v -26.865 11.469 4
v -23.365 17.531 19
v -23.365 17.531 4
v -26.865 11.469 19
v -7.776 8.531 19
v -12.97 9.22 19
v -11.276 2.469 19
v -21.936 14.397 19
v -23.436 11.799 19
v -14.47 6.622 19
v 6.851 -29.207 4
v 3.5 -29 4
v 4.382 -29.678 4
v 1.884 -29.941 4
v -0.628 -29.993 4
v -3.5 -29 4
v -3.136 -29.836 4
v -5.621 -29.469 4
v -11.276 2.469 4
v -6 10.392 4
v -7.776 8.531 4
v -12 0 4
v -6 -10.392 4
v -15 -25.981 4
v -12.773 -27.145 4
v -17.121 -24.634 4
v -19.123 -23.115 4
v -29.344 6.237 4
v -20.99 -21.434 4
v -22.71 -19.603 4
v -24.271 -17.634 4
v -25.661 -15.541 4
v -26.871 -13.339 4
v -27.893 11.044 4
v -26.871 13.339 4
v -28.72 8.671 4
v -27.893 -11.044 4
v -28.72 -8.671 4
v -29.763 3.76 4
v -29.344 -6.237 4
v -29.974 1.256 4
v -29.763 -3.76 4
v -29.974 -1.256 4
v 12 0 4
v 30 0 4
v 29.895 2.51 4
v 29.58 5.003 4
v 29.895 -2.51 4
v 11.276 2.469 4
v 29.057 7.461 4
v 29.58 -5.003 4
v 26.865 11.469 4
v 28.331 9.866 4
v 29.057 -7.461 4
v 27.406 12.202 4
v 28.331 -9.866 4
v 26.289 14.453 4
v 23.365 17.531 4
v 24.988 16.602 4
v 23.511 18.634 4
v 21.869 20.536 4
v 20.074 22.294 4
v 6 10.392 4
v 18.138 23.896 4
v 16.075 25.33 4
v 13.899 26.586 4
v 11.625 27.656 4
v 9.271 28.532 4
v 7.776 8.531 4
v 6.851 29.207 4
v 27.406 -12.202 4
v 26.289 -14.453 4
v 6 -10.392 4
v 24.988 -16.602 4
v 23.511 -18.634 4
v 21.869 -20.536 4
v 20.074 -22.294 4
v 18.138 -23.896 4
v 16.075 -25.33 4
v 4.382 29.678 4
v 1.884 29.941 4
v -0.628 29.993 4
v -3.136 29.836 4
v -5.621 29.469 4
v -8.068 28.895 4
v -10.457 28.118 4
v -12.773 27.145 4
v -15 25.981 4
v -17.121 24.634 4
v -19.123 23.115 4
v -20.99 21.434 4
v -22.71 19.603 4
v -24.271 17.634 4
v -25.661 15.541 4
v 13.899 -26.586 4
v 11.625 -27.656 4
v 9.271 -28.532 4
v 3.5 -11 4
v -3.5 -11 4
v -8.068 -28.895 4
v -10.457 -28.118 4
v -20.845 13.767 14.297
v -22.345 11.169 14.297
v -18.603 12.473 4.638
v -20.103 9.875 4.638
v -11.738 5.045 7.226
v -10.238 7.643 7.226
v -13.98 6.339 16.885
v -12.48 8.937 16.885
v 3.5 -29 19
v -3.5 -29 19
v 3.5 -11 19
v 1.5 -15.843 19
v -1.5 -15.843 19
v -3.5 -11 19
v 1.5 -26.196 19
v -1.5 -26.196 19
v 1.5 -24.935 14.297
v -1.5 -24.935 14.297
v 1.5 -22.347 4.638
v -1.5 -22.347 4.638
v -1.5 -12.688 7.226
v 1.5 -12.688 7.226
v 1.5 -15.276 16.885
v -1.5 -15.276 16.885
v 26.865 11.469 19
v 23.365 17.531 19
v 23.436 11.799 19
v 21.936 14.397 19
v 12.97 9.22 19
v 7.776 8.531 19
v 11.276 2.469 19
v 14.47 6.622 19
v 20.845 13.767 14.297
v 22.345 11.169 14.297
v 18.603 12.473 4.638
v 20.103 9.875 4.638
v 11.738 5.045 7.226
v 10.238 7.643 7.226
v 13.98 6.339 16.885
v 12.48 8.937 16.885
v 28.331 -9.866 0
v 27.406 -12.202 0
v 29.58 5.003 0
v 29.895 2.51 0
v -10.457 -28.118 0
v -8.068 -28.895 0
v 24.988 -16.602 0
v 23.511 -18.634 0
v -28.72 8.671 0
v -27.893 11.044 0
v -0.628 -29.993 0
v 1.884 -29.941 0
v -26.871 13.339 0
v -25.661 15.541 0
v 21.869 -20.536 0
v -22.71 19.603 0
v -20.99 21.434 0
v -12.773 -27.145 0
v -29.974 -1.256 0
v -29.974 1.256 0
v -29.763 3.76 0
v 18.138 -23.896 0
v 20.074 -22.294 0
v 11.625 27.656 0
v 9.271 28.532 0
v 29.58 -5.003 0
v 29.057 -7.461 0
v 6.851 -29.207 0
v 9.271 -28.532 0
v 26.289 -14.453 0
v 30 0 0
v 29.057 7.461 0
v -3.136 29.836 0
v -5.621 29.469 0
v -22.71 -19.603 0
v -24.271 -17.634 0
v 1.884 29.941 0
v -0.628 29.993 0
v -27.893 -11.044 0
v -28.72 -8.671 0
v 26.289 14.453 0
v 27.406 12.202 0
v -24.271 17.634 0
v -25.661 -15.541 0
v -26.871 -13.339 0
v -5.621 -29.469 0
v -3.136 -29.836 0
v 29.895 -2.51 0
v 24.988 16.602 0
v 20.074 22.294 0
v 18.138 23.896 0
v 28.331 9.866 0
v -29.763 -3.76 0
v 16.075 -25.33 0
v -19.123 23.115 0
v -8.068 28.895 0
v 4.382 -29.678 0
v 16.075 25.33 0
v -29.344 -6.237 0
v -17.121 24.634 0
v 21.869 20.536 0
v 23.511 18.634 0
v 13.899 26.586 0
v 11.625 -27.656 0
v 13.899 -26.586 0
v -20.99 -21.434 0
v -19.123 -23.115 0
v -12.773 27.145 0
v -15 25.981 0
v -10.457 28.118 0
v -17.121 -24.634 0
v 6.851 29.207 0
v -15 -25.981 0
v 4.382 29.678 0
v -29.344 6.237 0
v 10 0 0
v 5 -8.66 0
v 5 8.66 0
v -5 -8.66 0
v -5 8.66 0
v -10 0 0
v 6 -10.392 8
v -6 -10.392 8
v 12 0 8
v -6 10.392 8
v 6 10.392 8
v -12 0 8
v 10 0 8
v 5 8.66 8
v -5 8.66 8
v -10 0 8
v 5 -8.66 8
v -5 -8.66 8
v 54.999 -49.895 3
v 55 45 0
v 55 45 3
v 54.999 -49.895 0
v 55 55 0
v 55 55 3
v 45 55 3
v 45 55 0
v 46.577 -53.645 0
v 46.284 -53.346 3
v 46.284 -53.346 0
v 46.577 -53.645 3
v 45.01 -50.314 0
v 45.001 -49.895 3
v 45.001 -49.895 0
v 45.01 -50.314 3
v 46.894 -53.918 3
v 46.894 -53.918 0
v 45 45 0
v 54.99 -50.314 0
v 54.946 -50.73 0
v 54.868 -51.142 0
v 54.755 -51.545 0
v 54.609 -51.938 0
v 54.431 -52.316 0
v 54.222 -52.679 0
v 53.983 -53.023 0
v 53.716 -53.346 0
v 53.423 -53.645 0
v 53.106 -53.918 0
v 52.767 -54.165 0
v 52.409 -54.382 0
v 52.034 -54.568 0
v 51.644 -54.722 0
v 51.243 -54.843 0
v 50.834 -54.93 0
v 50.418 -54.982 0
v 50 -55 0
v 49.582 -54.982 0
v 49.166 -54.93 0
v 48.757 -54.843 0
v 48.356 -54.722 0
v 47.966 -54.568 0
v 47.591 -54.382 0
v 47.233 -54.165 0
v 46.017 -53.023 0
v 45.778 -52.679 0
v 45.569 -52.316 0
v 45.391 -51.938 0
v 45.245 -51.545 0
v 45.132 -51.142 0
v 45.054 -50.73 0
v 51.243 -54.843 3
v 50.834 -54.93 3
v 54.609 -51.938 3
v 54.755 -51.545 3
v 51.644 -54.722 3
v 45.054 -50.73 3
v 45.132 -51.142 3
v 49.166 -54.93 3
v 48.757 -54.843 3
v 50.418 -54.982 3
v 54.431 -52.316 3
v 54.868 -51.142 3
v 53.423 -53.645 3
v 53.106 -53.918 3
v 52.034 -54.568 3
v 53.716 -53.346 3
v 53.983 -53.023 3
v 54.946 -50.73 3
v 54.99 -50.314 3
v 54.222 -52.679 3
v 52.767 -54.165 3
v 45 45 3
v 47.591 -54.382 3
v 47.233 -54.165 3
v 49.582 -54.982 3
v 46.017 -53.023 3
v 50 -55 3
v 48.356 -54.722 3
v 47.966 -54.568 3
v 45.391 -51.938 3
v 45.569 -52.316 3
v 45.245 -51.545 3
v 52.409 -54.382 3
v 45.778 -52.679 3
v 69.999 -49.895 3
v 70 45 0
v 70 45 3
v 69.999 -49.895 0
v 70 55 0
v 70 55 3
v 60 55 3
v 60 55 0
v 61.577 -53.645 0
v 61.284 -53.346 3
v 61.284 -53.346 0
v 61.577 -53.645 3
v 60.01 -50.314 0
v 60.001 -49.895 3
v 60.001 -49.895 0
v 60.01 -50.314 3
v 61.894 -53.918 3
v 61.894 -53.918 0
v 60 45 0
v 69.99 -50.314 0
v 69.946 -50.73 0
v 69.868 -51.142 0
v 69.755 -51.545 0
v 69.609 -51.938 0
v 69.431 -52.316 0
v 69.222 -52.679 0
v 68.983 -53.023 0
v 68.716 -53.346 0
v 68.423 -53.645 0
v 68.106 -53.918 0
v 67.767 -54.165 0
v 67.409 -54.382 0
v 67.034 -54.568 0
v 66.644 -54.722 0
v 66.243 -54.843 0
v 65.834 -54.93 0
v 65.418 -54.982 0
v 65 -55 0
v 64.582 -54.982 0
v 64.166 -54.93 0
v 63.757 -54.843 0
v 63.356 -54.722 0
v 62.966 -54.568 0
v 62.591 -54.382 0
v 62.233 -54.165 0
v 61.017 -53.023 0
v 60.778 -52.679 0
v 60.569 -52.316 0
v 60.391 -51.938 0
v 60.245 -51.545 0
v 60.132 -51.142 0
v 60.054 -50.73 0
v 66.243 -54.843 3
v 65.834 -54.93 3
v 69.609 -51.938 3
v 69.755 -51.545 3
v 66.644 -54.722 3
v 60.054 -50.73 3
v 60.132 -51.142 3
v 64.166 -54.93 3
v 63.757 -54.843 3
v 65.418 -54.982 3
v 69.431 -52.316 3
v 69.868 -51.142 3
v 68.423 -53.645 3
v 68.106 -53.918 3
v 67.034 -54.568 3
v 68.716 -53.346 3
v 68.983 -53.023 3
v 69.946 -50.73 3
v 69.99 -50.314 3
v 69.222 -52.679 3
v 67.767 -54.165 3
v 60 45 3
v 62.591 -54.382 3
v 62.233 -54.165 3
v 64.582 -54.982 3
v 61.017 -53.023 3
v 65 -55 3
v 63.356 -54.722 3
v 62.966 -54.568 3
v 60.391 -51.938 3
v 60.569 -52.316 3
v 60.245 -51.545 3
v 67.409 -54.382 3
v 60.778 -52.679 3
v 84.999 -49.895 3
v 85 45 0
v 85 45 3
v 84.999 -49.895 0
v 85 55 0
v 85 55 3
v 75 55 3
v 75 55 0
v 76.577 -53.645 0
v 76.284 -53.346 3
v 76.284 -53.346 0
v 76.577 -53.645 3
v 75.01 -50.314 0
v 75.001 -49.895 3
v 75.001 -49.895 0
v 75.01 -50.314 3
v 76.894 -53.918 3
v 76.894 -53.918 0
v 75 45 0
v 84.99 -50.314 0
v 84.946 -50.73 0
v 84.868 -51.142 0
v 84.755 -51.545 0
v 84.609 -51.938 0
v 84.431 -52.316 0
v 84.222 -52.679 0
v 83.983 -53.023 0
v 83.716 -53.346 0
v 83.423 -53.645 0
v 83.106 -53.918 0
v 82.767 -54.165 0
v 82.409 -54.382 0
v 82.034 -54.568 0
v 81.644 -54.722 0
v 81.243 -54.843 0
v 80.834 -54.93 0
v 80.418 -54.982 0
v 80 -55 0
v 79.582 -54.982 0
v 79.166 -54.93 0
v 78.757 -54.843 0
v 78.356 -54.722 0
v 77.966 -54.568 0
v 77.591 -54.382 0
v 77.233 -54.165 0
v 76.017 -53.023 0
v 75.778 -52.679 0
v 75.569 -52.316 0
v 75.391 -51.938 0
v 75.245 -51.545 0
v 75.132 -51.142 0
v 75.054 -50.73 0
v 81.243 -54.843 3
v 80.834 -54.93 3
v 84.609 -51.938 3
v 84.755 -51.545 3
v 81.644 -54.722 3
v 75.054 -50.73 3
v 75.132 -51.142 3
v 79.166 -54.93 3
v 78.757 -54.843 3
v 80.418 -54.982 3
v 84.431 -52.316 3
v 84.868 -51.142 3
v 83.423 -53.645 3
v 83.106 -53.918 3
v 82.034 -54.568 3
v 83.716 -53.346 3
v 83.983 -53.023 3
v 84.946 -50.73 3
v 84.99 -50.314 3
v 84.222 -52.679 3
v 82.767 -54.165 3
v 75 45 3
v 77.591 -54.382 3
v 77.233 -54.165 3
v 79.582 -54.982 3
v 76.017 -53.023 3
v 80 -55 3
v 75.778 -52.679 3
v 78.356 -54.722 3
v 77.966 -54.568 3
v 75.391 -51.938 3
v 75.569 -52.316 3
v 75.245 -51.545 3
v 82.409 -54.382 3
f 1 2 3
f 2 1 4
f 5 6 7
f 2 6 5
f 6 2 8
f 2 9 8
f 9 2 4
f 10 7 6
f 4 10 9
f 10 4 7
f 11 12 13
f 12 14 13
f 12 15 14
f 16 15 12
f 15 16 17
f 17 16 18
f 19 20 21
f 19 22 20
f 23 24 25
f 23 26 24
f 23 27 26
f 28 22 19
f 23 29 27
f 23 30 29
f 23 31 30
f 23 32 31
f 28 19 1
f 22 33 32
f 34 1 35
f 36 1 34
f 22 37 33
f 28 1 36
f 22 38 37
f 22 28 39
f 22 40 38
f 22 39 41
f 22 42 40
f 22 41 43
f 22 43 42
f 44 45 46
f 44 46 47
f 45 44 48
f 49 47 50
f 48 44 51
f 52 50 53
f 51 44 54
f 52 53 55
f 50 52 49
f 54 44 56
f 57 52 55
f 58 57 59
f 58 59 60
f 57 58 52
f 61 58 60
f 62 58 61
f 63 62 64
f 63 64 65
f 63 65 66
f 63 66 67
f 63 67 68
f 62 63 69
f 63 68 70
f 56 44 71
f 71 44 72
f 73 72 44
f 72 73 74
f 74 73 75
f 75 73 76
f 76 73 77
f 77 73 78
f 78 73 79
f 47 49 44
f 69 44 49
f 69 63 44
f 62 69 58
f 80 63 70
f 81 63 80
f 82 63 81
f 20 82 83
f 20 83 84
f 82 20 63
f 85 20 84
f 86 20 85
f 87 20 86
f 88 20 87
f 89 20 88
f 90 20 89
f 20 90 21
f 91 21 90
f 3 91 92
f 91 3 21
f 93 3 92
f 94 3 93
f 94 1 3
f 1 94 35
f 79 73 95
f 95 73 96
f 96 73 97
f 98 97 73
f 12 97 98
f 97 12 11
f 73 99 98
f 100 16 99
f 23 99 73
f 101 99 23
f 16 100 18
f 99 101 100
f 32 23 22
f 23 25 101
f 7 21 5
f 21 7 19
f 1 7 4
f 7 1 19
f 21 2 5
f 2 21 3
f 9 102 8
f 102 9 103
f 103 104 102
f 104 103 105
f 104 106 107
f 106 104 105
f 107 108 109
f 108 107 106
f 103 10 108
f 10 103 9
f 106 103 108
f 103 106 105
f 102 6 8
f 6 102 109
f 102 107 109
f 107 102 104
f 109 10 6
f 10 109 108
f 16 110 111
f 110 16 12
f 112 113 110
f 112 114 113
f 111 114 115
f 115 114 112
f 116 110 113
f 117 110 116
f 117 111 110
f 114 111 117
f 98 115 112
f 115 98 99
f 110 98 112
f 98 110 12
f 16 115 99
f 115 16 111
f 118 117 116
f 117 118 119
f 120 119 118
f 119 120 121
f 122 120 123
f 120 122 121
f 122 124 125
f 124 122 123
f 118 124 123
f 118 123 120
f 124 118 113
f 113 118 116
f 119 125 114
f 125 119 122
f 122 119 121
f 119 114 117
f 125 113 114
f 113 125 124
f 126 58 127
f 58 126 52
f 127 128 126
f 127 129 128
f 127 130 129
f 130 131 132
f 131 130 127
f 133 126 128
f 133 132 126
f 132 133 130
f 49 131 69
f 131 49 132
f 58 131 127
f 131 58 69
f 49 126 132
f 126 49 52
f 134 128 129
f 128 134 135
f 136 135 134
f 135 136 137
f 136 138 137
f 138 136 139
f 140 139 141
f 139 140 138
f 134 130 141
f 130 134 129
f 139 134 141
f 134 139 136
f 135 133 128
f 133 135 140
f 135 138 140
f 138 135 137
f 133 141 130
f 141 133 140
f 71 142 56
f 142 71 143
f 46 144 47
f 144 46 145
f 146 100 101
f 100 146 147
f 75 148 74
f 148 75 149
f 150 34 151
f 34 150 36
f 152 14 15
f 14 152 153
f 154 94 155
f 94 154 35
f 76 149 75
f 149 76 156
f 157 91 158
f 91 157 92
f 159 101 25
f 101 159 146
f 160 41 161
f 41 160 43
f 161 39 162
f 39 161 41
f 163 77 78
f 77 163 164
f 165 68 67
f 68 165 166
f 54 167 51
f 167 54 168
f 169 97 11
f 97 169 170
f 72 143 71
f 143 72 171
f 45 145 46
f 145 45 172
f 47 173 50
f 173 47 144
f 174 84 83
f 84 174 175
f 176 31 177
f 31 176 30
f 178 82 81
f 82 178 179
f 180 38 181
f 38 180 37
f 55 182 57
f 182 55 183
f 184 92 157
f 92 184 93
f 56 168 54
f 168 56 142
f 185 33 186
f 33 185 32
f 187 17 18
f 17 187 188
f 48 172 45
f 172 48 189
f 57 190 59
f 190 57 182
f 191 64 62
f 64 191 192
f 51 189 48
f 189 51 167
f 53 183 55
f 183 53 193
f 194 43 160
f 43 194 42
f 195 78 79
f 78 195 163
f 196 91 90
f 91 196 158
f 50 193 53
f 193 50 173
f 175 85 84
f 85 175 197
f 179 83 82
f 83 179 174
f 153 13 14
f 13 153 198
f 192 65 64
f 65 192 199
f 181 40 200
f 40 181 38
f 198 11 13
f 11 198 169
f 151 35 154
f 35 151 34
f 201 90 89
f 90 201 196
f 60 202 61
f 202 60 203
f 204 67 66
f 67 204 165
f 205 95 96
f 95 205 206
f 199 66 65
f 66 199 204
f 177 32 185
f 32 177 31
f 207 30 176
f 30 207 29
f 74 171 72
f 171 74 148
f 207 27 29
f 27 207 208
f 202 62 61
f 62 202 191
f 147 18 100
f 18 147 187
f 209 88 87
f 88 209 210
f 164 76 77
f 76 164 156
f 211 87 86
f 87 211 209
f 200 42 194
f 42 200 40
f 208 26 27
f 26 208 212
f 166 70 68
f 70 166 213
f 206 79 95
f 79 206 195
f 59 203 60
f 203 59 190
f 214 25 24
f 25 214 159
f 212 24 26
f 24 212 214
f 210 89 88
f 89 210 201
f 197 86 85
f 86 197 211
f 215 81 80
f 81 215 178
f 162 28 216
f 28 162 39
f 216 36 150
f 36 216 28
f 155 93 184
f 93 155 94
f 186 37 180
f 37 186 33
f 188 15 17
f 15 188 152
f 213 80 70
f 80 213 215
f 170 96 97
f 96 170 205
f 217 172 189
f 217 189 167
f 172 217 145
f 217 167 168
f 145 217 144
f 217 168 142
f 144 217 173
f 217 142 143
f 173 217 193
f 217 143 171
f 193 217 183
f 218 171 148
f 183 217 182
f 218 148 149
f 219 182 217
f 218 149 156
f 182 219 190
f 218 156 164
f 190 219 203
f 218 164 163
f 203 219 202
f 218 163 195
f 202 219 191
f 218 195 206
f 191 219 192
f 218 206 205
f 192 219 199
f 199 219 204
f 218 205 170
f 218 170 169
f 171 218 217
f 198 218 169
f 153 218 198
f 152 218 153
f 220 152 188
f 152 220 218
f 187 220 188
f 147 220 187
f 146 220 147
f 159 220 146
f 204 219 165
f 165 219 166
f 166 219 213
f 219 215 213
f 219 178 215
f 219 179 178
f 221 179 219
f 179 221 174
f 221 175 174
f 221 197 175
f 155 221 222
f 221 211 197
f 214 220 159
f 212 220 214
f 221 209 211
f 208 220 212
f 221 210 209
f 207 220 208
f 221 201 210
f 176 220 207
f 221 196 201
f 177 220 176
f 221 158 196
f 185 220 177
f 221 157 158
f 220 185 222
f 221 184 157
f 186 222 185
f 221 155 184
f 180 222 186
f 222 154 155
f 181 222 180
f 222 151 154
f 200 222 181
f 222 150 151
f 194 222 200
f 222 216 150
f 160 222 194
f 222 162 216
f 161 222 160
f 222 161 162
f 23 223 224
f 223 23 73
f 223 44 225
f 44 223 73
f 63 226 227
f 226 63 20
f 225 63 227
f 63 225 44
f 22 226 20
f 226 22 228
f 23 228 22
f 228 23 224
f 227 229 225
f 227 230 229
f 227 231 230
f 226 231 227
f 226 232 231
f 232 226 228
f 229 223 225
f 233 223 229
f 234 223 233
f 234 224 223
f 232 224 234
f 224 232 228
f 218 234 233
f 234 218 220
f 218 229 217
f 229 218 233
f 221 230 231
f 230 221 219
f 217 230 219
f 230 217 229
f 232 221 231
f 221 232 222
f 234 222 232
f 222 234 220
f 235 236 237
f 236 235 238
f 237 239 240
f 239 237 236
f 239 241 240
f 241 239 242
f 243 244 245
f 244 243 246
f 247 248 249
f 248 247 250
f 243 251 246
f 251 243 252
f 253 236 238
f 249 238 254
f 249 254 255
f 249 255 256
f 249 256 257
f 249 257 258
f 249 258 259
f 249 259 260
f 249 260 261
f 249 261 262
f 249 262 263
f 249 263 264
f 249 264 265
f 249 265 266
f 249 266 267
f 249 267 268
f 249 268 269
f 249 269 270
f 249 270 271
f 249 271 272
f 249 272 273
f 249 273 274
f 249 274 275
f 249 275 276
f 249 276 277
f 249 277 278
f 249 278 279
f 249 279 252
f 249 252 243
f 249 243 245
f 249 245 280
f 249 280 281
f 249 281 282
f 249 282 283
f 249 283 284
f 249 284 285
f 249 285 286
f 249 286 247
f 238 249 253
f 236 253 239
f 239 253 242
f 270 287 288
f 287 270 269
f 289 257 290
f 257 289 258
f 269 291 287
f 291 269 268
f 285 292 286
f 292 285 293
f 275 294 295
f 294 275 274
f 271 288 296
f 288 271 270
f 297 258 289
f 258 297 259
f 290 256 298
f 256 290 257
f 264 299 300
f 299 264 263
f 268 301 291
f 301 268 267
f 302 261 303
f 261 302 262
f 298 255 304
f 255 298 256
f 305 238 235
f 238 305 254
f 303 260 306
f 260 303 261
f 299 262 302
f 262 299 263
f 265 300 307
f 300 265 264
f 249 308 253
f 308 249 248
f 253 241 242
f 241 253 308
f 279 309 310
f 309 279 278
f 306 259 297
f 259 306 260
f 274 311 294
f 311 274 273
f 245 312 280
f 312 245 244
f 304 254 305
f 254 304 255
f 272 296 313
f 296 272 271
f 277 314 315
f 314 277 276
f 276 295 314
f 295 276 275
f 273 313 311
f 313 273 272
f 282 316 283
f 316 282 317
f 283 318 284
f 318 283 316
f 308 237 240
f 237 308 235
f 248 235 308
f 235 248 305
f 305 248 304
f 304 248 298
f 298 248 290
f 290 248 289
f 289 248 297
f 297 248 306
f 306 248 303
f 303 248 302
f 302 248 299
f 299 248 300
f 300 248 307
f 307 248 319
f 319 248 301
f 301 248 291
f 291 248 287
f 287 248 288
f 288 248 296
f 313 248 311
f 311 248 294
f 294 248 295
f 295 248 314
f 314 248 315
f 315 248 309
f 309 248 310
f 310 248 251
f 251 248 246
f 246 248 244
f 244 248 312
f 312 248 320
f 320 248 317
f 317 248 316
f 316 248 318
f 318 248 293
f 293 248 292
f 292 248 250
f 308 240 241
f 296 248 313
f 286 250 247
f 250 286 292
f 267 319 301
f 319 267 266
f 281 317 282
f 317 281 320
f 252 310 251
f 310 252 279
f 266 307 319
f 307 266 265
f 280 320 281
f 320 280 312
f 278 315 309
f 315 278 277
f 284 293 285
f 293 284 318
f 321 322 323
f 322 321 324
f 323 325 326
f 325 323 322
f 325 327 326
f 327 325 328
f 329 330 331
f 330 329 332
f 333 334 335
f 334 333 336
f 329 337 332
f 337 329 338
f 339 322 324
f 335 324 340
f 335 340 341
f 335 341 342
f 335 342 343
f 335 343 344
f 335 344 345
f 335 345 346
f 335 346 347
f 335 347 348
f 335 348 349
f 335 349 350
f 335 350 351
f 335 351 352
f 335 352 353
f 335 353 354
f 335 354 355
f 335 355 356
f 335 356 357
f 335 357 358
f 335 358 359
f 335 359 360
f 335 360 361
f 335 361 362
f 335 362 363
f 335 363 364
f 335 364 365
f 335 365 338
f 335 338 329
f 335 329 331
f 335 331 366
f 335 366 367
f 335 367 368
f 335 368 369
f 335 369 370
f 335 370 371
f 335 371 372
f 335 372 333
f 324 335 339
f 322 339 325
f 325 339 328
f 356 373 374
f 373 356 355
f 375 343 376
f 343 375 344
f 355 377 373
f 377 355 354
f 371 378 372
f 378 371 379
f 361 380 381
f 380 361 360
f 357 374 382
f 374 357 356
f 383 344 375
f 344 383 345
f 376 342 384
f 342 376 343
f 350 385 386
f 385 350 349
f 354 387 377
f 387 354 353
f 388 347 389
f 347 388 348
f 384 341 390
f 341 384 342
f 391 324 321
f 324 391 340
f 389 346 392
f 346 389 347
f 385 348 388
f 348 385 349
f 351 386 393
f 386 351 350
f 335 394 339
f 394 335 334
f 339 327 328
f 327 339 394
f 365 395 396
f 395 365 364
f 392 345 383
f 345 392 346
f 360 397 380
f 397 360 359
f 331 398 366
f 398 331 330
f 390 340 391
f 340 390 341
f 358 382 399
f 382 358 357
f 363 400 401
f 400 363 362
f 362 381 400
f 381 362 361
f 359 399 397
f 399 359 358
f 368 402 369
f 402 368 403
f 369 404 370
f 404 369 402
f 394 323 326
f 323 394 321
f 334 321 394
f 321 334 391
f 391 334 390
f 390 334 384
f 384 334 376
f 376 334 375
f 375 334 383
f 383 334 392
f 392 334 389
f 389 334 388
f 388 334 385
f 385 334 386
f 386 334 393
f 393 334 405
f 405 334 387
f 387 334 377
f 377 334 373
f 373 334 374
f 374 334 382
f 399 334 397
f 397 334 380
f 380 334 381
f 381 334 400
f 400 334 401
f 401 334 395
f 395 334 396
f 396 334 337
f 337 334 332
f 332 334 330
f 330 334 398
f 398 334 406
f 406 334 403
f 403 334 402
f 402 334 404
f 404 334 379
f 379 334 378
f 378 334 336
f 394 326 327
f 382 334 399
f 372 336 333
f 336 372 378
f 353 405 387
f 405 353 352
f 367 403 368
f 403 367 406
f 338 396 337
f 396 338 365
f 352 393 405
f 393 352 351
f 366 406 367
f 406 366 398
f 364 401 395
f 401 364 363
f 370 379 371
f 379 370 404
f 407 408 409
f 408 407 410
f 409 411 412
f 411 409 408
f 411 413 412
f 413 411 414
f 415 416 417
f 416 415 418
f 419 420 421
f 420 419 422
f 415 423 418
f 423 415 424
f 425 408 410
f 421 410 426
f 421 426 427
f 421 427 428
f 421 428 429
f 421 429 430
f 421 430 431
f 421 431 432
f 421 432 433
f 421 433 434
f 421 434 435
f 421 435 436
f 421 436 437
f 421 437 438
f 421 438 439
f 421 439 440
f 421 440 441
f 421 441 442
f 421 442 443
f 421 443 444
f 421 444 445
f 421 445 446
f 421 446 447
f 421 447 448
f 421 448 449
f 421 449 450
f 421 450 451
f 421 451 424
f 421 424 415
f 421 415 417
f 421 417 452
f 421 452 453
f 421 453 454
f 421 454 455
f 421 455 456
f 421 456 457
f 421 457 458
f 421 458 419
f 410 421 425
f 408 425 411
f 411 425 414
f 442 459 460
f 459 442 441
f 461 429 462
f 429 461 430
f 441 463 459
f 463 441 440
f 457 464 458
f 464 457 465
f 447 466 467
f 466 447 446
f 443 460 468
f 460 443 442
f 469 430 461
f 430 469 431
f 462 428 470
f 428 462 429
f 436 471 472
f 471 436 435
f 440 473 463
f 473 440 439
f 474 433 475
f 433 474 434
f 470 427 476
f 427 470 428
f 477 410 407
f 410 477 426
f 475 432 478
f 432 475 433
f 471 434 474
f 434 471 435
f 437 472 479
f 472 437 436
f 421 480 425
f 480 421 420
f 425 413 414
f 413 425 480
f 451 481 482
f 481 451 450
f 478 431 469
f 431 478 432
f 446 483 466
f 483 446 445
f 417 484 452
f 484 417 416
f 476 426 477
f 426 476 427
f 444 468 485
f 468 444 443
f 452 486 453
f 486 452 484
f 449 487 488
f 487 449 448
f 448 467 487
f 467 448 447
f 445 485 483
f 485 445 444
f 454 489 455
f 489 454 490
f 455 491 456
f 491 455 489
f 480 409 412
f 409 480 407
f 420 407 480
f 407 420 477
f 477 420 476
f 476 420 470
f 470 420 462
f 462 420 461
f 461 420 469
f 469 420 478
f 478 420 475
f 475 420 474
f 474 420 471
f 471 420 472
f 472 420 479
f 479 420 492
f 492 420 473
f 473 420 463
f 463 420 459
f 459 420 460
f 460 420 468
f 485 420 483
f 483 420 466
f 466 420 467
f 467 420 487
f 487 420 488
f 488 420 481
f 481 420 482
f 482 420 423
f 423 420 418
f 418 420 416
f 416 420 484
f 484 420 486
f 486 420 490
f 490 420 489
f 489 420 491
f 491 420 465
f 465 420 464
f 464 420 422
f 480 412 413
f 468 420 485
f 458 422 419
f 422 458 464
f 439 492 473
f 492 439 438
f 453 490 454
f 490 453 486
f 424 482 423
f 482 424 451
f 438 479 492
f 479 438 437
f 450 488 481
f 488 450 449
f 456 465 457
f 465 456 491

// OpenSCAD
BaseRadius = 30;
BaseHeight = 4;
LegWidth = 10;
LegThicknes = 3;
LegHeight = 100;
LegPlugThickness = 4;
LegAngle = 15;
LegOffset = 0;
// Workarround for slicer software without XY/Horz. Compensation
LegPlugXYCompensation = 0;
HolderRadius=10;
HolderType = "Hexagon"; //[Circle,Hexagon]
DrawType = "All"; //[Head,Legs,All,Demo]

/* [HIDDEN] */
$fn = 75;

if(DrawType == "Head") Head();
if(DrawType == "Demo") rotate([180,0,0])Head();
if(DrawType == "Legs") rotate([90,0,0])Leg();
if(DrawType == "All") {
    Head();
    for(a=[1:3]) 
        translate([BaseRadius+5+a*(LegWidth+5),LegHeight/2,LegThicknes/2])
            rotate([90,0,0])
                Leg();
}

module Head(){
    difference(){
        hFn = HolderType == "Circle" ? 50:6;
        union(){
            Base();
            translate([0,0,BaseHeight]) 
                cylinder(r=HolderRadius+2,h=BaseHeight*2,center=true,$fn=hFn);
        }    
        cylinder(r=HolderRadius,h=100,center=true,$fn=hFn);
    }
}
module Base(){
    cylinder(r=BaseRadius,h=BaseHeight);
    for(a=[1:3]){
        rotate(30+a*120)
            translate([BaseRadius-LegWidth,0,BaseHeight])
                Plug();
    }
}
module Plug(){
    bHeigh = LegWidth*1.5;
    if(DrawType == "Demo"){
        translate([0,0,bHeigh/2]) 
            cube([LegWidth+LegPlugThickness*2,LegThicknes+LegPlugThickness, bHeigh],center=true);
        translate([-3,0,0])
            rotate([0,LegAngle,0]) 
                translate([-LegOffset,0,LegThicknes+4])
                    Leg(LegPlugXYCompensation);
    }
    else{
        difference(){
            translate([0,0,bHeigh/2]) 
                cube([LegWidth+LegPlugThickness*2,LegThicknes+LegPlugThickness, bHeigh],center=true);
            translate([-3,0,0])
                rotate([0,LegAngle,0]) 
                    translate([-LegOffset,0,LegThicknes+4])
                        Leg(LegPlugXYCompensation);
        }
    }
}

module Leg(legThModf=0){
    rotate([90,-90,0]){
        hull(){
            cube([LegWidth+legThModf,LegWidth+legThModf,LegThicknes+legThModf],center=true);
            translate([LegHeight,0,0]) cylinder(d=LegWidth,h=LegThicknes+legThModf,center=true);
        }
    }
}
